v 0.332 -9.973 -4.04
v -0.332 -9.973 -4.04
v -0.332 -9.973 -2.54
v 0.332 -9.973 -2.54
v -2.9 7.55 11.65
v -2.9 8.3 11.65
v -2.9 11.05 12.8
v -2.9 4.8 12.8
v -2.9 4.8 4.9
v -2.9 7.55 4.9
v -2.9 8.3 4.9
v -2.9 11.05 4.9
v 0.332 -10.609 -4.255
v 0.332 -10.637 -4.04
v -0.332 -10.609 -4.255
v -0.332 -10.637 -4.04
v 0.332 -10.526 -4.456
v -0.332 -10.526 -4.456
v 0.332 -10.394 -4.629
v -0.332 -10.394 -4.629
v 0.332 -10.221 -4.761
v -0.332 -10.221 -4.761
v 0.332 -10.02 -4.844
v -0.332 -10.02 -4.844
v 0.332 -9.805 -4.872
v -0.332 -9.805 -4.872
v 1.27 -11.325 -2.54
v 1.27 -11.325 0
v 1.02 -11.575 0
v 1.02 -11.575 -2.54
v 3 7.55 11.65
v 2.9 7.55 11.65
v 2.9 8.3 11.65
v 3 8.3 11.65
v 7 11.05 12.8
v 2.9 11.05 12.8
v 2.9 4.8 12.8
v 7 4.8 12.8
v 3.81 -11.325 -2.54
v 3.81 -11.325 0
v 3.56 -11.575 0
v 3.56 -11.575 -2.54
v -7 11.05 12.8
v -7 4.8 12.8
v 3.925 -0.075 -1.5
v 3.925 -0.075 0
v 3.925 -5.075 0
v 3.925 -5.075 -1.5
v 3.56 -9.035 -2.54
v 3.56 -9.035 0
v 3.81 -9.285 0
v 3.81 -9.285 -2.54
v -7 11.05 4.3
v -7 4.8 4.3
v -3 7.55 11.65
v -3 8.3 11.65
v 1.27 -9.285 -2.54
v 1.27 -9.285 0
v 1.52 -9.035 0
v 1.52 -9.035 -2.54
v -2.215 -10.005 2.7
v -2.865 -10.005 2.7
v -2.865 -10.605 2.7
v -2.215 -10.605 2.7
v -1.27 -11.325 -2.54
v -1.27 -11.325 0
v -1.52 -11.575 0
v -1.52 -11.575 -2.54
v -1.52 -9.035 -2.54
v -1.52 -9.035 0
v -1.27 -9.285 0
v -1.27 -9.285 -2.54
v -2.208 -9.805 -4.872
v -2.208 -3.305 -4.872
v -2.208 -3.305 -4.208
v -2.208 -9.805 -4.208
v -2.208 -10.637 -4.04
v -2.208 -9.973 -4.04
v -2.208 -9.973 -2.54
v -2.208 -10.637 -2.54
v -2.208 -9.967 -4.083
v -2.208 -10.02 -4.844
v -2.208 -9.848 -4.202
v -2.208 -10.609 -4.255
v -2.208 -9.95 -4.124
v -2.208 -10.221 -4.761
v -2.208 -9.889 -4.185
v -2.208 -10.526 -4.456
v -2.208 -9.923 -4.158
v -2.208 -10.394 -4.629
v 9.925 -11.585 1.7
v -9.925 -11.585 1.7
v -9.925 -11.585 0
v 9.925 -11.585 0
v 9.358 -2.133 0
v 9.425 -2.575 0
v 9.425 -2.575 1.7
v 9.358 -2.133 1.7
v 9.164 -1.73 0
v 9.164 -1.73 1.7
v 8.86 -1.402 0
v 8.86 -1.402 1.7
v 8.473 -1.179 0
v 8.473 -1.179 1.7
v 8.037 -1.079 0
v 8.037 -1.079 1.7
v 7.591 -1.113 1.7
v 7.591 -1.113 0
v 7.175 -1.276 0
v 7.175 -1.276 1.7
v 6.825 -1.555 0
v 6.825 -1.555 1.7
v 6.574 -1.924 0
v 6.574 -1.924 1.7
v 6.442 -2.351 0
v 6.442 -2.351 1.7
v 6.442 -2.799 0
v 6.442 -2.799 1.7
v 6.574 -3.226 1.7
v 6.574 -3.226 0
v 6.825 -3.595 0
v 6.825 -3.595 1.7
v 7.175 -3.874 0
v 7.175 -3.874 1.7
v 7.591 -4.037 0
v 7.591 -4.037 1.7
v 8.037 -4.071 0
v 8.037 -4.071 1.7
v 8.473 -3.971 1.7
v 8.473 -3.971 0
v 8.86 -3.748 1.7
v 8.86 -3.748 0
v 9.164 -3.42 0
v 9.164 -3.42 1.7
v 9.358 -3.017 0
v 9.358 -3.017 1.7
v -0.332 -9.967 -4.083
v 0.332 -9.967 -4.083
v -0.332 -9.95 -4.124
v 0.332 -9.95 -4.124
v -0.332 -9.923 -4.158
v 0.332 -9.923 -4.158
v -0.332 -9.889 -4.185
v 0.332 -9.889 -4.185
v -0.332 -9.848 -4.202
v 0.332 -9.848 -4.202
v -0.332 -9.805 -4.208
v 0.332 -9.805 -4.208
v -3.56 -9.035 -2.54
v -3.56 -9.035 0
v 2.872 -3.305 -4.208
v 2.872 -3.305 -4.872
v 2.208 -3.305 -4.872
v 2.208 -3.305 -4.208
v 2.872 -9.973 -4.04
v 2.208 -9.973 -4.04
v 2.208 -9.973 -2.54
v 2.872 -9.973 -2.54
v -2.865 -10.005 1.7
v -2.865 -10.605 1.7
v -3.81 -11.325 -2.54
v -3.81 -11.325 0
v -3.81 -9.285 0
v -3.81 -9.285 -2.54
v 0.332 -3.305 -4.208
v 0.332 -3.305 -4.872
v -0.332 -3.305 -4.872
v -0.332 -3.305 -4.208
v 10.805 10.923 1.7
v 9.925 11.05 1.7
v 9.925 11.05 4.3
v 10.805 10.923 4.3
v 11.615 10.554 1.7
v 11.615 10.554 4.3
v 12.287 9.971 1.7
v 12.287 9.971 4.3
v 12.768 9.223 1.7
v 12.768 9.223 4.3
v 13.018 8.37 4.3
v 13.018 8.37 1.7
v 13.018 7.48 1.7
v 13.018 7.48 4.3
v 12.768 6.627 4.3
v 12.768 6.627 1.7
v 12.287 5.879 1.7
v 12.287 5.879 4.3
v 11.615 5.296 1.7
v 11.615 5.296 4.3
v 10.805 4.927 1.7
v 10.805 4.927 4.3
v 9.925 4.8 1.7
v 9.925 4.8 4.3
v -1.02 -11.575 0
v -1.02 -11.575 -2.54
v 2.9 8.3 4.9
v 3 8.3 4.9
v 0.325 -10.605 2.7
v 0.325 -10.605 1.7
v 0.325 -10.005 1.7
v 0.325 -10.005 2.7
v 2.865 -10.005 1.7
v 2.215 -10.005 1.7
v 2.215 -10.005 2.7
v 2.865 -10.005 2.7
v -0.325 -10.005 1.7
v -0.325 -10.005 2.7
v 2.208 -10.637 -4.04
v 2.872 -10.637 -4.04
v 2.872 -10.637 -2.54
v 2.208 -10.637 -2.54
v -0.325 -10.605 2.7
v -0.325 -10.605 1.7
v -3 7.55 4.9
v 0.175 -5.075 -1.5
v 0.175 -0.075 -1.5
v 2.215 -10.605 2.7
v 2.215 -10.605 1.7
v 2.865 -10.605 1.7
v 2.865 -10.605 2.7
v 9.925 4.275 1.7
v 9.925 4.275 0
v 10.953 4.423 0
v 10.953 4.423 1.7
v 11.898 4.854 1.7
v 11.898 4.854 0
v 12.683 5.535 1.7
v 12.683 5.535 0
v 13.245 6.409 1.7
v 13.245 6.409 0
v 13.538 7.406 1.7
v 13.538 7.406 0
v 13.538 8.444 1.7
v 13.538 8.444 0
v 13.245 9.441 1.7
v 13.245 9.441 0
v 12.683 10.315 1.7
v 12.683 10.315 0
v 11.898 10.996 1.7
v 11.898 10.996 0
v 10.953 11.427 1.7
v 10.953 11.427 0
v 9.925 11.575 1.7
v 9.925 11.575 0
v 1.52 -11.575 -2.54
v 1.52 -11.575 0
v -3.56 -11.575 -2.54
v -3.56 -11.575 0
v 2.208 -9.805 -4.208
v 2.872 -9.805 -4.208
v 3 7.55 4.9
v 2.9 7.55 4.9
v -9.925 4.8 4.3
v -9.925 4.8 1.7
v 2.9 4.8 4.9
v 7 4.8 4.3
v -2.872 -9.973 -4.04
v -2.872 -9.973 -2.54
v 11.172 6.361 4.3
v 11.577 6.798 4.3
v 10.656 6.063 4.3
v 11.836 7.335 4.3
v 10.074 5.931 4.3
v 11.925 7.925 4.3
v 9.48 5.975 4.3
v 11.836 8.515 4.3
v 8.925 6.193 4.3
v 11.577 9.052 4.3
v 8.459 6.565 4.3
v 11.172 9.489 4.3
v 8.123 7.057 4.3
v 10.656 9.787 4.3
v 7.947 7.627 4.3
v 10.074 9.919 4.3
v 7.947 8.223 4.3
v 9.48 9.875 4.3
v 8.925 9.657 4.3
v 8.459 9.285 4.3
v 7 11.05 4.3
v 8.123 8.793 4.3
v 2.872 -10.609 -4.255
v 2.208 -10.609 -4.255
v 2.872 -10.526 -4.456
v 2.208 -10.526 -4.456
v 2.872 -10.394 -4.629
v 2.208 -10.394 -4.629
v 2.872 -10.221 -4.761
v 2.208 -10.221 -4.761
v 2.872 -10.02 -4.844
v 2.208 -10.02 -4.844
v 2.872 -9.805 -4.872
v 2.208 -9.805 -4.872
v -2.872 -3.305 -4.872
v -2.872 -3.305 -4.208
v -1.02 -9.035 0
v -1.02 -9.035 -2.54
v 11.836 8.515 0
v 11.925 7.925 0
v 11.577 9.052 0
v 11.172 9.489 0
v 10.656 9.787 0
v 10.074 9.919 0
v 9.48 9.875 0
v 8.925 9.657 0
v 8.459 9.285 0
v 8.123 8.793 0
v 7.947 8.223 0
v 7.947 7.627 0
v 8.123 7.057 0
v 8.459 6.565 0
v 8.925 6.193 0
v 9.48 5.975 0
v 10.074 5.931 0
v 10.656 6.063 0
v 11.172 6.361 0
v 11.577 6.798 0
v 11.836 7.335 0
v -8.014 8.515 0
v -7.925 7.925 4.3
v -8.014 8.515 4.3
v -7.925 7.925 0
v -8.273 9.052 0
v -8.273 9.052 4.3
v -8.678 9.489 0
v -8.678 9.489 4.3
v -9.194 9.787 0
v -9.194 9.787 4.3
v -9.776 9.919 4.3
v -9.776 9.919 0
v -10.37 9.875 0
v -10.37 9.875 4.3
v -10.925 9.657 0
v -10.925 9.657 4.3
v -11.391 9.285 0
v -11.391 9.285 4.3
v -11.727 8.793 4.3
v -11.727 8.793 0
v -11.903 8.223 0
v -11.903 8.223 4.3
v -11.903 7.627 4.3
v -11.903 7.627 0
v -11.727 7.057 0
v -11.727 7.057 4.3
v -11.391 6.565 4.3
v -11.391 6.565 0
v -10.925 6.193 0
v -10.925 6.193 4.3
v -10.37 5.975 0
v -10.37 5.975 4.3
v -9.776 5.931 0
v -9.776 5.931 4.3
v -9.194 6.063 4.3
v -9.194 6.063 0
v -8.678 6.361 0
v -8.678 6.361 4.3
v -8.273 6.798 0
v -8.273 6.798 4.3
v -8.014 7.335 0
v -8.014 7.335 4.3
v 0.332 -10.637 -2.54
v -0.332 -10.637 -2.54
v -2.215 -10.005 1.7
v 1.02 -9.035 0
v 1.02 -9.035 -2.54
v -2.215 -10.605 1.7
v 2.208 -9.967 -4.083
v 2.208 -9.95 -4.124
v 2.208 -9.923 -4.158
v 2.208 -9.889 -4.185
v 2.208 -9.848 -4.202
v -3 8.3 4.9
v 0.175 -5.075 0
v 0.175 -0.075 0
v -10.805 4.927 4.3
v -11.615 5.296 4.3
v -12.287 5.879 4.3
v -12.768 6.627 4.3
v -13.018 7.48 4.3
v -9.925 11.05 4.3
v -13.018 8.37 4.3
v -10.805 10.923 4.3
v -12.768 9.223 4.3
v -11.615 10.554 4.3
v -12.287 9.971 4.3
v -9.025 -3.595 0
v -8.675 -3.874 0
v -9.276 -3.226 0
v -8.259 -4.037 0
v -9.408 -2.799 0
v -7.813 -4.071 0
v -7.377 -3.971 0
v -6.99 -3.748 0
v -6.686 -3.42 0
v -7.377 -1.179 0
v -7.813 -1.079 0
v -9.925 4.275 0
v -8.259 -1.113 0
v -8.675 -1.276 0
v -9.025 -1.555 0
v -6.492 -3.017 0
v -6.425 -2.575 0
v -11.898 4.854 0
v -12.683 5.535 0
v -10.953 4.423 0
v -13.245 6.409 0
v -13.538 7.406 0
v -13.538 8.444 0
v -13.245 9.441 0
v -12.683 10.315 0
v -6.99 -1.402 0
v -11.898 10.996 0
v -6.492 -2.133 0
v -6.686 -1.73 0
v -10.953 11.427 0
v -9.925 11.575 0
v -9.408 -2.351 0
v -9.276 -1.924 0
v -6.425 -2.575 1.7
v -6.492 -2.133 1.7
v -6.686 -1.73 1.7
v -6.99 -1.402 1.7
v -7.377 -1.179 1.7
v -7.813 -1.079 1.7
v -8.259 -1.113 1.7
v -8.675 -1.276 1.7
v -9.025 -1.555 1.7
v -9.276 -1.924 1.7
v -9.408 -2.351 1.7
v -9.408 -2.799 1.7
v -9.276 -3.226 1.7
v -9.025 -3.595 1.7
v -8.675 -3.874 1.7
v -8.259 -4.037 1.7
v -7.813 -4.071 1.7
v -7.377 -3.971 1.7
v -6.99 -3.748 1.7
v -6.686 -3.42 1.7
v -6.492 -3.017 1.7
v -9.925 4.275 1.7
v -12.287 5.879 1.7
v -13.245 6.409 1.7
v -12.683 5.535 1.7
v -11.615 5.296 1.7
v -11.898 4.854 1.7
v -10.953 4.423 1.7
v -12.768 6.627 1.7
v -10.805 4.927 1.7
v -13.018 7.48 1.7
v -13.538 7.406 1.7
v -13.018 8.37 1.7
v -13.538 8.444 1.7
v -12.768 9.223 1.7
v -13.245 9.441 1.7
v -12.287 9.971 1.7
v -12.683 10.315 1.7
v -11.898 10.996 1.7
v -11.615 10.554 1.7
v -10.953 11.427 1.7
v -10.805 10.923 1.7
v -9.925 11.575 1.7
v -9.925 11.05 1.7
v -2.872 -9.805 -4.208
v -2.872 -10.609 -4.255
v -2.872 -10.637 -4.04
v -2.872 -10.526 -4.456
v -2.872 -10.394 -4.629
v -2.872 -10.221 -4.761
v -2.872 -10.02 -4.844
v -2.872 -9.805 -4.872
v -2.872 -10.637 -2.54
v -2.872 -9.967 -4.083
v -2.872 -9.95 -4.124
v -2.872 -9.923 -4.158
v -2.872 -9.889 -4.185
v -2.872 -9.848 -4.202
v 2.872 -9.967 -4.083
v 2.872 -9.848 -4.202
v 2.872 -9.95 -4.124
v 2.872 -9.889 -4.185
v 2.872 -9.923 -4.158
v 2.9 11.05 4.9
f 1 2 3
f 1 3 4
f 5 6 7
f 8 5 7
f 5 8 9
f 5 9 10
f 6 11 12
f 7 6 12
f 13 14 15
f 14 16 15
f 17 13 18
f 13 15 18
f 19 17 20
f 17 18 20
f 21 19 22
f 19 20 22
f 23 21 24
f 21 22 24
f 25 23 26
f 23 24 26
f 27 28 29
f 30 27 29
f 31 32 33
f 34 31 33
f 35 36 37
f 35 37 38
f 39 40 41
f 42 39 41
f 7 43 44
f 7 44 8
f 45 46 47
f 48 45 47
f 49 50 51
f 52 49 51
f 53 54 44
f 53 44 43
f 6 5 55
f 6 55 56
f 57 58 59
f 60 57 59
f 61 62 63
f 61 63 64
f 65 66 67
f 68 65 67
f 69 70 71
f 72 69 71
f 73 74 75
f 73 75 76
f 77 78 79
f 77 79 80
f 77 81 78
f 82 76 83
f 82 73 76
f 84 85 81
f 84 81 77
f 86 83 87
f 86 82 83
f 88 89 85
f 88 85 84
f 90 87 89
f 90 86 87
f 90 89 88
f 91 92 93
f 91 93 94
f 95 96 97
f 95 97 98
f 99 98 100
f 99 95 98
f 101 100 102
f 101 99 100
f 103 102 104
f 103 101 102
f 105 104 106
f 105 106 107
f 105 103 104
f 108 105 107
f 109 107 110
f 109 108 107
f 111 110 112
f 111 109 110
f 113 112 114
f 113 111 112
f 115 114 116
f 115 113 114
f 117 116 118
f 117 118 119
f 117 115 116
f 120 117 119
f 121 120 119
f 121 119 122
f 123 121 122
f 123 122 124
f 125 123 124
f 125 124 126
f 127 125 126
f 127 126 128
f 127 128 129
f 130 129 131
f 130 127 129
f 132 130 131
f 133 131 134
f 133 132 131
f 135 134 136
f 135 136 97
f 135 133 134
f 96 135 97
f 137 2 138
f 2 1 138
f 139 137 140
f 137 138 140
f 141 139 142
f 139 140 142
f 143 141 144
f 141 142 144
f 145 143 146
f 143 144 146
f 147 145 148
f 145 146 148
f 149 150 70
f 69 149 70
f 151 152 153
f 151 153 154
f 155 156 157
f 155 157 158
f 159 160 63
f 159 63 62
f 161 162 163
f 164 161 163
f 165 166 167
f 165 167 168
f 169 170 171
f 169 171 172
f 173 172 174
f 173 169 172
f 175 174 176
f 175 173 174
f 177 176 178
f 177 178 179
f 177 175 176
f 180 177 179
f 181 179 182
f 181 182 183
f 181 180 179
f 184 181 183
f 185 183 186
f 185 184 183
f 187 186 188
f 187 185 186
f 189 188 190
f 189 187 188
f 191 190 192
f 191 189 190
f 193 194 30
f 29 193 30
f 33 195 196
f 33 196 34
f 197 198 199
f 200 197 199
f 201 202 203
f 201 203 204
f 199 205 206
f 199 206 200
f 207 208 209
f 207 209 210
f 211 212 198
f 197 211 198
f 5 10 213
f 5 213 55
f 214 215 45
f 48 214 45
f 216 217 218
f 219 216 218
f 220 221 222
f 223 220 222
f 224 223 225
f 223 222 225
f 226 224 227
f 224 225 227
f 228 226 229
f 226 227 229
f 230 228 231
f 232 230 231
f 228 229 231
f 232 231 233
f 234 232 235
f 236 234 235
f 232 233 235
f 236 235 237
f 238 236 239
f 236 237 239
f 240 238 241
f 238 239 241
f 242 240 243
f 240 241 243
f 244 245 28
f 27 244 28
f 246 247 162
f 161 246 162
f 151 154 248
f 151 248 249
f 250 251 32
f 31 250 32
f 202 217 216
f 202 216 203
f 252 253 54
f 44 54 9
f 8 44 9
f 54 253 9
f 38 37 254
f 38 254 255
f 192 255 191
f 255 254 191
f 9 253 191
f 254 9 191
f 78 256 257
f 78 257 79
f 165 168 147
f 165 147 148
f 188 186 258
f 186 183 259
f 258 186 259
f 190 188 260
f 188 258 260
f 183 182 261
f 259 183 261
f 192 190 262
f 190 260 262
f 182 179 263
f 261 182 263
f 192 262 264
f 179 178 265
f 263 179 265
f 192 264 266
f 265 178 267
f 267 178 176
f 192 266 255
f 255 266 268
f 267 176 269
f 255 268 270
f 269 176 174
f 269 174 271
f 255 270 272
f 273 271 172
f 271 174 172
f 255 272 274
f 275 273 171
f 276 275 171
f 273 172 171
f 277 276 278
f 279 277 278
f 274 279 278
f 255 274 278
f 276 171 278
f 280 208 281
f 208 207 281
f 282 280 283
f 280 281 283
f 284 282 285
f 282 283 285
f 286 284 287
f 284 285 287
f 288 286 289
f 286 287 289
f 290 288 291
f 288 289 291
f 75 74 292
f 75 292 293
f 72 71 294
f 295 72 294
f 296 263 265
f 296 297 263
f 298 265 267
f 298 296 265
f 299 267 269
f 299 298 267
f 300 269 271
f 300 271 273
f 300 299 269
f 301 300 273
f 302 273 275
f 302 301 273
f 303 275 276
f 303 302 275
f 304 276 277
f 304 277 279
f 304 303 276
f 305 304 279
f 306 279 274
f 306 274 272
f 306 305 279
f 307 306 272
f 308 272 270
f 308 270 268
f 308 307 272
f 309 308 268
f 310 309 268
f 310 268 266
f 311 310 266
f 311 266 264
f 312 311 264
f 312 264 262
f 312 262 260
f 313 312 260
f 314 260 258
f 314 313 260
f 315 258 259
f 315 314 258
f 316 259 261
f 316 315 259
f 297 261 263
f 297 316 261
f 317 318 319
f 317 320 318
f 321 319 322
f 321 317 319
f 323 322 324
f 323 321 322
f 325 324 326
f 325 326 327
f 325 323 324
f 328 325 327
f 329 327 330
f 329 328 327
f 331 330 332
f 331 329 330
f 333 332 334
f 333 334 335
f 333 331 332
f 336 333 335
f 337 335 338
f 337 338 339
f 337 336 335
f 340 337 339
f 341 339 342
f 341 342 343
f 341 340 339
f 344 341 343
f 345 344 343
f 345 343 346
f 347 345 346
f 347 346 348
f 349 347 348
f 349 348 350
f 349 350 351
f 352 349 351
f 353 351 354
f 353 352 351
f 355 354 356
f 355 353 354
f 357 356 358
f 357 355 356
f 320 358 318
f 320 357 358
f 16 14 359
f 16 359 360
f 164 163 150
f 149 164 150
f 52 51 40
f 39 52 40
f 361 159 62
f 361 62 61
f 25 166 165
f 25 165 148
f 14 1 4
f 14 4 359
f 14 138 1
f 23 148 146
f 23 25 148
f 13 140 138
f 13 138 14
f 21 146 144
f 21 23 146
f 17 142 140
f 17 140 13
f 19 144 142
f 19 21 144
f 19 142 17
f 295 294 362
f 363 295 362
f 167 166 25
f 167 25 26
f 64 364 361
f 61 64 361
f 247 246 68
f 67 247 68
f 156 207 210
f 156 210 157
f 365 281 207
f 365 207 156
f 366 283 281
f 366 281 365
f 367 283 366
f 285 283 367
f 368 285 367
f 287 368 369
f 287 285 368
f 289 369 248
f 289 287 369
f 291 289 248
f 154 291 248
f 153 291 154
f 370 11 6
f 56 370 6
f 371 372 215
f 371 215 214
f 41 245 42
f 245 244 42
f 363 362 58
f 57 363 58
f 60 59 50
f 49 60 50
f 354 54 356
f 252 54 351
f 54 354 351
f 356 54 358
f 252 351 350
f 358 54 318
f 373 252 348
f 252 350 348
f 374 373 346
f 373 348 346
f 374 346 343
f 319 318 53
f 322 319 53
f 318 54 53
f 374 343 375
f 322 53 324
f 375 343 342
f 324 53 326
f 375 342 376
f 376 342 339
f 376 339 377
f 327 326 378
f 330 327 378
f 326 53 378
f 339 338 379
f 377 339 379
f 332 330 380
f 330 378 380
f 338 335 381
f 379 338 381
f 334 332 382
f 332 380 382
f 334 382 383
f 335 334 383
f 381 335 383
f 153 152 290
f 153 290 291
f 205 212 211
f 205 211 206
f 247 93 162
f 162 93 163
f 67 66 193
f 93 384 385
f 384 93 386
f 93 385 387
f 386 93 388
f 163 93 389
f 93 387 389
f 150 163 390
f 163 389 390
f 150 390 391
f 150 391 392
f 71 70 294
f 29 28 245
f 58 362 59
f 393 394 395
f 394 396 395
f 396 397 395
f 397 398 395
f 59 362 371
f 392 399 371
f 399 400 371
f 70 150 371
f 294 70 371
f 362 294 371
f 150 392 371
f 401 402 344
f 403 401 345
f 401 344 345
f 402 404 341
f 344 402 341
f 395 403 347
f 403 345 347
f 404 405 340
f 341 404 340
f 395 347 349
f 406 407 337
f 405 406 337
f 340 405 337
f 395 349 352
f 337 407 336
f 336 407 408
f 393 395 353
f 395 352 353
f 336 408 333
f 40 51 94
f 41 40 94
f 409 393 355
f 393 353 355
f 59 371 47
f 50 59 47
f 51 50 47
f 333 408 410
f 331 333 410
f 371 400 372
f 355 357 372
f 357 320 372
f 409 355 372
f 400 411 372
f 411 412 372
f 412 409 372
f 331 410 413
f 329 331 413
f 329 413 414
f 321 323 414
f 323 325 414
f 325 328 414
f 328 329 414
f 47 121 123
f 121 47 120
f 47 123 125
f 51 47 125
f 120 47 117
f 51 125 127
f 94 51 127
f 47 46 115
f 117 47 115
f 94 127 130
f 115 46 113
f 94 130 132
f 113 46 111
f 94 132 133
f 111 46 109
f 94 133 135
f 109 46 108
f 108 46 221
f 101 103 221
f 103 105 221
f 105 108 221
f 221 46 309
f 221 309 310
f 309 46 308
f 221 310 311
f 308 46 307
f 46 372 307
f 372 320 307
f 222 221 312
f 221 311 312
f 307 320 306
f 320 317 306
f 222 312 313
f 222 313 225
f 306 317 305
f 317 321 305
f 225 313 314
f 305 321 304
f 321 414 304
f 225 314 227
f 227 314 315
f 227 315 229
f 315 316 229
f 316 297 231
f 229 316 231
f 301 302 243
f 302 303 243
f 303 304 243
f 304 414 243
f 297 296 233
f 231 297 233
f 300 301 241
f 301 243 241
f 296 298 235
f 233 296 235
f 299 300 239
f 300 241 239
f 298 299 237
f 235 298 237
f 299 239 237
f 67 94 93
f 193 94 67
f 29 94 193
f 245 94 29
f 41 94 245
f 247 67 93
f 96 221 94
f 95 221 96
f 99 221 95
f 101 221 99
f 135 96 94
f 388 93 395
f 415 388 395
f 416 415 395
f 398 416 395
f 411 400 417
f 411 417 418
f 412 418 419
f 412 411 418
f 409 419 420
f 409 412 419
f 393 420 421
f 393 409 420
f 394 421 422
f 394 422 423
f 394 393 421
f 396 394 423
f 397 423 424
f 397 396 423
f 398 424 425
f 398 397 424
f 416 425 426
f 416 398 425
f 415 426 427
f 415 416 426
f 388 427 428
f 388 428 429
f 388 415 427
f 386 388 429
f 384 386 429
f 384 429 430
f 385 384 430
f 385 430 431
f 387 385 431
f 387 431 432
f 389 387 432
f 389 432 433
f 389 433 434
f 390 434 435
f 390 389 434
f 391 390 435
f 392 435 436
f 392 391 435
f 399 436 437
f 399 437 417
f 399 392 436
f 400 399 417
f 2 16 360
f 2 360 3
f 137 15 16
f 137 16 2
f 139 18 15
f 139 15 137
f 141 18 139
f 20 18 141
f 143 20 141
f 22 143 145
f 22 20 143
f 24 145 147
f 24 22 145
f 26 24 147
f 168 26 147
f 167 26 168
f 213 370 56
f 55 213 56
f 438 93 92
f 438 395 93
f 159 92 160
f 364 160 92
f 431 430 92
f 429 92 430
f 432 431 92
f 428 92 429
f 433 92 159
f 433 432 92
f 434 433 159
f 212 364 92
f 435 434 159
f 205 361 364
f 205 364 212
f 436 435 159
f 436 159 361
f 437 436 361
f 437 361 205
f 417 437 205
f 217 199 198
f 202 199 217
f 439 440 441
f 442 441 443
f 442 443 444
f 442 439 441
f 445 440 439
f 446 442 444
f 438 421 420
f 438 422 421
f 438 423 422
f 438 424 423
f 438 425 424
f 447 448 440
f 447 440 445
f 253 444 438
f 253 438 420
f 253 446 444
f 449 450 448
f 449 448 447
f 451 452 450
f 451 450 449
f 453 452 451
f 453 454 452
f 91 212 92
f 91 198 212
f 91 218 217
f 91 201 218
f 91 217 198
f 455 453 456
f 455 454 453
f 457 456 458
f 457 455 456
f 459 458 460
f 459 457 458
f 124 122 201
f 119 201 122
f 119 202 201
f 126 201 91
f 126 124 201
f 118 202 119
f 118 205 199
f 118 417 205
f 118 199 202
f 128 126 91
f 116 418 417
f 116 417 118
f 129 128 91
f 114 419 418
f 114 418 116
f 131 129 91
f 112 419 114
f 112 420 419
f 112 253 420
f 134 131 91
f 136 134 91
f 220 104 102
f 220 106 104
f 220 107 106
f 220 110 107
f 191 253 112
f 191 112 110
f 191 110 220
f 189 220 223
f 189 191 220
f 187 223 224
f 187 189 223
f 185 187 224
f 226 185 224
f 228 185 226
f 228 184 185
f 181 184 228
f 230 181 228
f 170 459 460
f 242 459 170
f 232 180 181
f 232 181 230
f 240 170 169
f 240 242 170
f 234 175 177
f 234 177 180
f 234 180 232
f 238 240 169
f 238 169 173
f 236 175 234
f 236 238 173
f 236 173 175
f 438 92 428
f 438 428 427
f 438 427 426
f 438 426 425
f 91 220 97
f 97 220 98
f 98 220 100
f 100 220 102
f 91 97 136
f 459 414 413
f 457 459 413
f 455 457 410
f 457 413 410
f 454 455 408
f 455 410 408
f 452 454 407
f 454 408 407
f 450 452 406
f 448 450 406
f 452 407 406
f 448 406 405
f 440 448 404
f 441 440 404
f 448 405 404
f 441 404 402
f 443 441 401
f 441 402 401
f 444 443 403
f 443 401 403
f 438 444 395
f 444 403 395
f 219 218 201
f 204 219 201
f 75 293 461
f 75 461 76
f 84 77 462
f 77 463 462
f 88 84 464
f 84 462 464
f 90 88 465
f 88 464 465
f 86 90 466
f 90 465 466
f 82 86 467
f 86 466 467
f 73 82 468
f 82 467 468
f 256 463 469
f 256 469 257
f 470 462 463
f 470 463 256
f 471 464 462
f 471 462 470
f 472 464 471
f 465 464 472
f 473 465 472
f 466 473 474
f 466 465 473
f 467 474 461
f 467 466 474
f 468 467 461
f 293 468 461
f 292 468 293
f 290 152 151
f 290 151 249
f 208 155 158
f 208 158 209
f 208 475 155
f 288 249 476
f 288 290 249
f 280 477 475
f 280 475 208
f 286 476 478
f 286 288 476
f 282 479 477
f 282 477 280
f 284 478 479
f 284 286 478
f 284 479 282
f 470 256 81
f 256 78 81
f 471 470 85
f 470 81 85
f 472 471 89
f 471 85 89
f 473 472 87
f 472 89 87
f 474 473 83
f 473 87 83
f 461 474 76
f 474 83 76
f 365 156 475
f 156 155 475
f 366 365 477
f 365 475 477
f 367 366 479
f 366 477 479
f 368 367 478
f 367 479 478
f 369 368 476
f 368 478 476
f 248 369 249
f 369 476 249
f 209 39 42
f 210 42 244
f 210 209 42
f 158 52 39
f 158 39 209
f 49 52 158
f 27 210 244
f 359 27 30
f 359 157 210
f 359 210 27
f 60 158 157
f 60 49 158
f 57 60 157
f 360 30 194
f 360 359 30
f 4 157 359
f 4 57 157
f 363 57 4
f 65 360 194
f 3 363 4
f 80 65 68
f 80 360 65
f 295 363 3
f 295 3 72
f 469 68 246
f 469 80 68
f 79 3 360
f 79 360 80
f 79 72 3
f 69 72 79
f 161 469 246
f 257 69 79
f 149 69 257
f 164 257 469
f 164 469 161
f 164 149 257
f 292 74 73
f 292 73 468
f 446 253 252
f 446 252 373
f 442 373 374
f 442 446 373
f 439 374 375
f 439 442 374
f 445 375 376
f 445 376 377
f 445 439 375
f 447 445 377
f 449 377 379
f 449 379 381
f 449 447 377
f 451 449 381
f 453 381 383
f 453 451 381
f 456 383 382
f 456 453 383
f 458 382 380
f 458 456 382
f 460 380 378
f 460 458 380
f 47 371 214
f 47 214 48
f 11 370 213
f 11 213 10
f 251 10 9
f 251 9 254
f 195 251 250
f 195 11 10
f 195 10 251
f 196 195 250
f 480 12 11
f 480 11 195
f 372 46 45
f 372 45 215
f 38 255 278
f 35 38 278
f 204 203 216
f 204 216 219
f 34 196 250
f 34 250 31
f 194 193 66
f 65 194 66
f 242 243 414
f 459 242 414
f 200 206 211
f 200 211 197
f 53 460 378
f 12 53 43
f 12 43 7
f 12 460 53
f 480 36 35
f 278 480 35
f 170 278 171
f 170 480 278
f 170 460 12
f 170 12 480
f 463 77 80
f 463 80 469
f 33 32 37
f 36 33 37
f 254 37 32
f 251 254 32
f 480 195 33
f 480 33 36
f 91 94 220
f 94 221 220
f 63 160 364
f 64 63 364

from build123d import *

# Parameters (mm, degrees)
IZIM1_R                     = 2
IZIM1_R_2                   = 1.5
Y_KSEKLIK_EKSTR_ZYON1_DEPTH = 1.7
IZIM2_R                     = 2
Y_KSEKLIK_EKSTR_ZYON2_DEPTH = 2.6
IZIM3_W                     = 4.100055298
IZIM3_H                     = 6.25
Y_KSEKLIK_EKSTR_ZYON3_DEPTH = 8.5
IZIM4_W                     = 5.8
IZIM4_H                     = 6.25
Y_KSEKLIK_EKSTR_ZYON4_DEPTH = 0.6
Y_KSEKLIK_EKSTR_ZYON6_DEPTH = 2.54
IZIM6_W                     = 19.85
IZIM6_H                     = 1.7
Y_KSEKLIK_EKSTR_ZYON7_DEPTH = 0.01
IZIM7_W                     = 6.75
IZIM7_H                     = 0.75
KES_EKSTR_ZYON1_DEPTH       = 5.9
KES_EKSTR_ZYON1_DEPTH_BACK  = 0.1
IZIM8_W                     = 0.664910116
IZIM8_H                     = 0.664910116
IZIM11_W                    = 0.65
IZIM11_H                    = 0.6
Y_KSEKLIK_EKSTR_ZYON8_DEPTH = 1
Y_KSEKLIK_EKSTR_ZYON9_DEPTH = 1.5


with BuildPart() as part:
    # Çizim1 → Yükseklik-Ekstrüzyon1 (new body)
    with BuildSketch(Plane.XY):
        with BuildLine():
            Line((-9.925, -11.575), (9.925, -11.575))
            Line((9.925, -11.575), (9.925, 4.275))
            ThreePointArc((9.925, 4.275), (13.575, 7.925), (9.925, 11.575))
            Line((9.925, 11.575), (-9.925, 11.575))
            ThreePointArc((-9.925, 11.575), (-13.575, 7.925), (-9.925, 4.275))
            Line((-9.925, 4.275), (-9.925, -11.575))
        make_face()
        with Locations((9.925, 7.925)):
            Circle(IZIM1_R, mode=Mode.SUBTRACT)
        with Locations((-9.925, 7.925)):
            Circle(IZIM1_R, mode=Mode.SUBTRACT)
        with Locations((7.925, -2.575)):
            Circle(IZIM1_R_2, mode=Mode.SUBTRACT)
        with Locations((-7.925, -2.575)):
            Circle(IZIM1_R_2, mode=Mode.SUBTRACT)
    extrude(amount=Y_KSEKLIK_EKSTR_ZYON1_DEPTH)

    # Çizim2 → Yükseklik-Ekstrüzyon2 (add)
    with BuildSketch(Plane.XY.offset(1.7)):
        with BuildLine():
            Line((-9.925, 11.05), (9.925, 11.05))
            ThreePointArc((9.925, 11.05), (13.05, 7.925), (9.925, 4.8))
            Line((9.925, 4.8), (-9.925, 4.8))
            ThreePointArc((-9.925, 4.8), (-13.05, 7.925), (-9.925, 11.05))
        make_face()
        with Locations((-9.925, 7.925)):
            Circle(IZIM2_R, mode=Mode.SUBTRACT)
        with Locations((9.925, 7.925)):
            Circle(IZIM2_R, mode=Mode.SUBTRACT)
    extrude(amount=Y_KSEKLIK_EKSTR_ZYON2_DEPTH)

    # Çizim3 → Yükseklik-Ekstrüzyon3 (add)
    with BuildSketch(Plane.XY.offset(4.3)):
        with Locations((4.950027649, 7.925)):
            Rectangle(IZIM3_W, IZIM3_H)
        with Locations((-4.950027649, 7.925)):
            Rectangle(IZIM3_W, IZIM3_H)
    extrude(amount=Y_KSEKLIK_EKSTR_ZYON3_DEPTH)

    # Çizim4 → Yükseklik-Ekstrüzyon4 (add)
    with BuildSketch(Plane.XY.offset(4.3)):
        with Locations((0, 7.925)):
            Rectangle(IZIM4_W, IZIM4_H)
    extrude(amount=Y_KSEKLIK_EKSTR_ZYON4_DEPTH)

    # Çizim5 → Yükseklik-Ekstrüzyon6 (add)
    with BuildSketch(Plane(origin=(0, 0, 0), x_dir=(-1, 0, 0), z_dir=(0, 0, -1))):
        Polygon((-1.27, -11.325), (-1.27, -9.285), (-1.52, -9.035), (-3.56, -9.035), (-3.81, -9.285), (-3.81, -11.325), (-3.56, -11.575), (-1.52, -11.575), align=None)
        Polygon((1.27, -9.285), (1.02, -9.035), (-1.02, -9.035), (-1.27, -9.285), (-1.27, -11.325), (-1.02, -11.575), (1.02, -11.575), (1.27, -11.325), align=None)
        Polygon((1.52, -9.035), (1.27, -9.285), (1.27, -11.325), (1.52, -11.575), (3.56, -11.575), (3.81, -11.325), (3.81, -9.285), (3.56, -9.035), align=None)
    extrude(amount=Y_KSEKLIK_EKSTR_ZYON6_DEPTH)

    # Çizim6 → Yükseklik-Ekstrüzyon7 (add)
    with BuildSketch(Plane.XZ.offset(11.575)):
        with Locations((0, 0.85)):
            Rectangle(IZIM6_W, IZIM6_H)
    extrude(amount=Y_KSEKLIK_EKSTR_ZYON7_DEPTH)

    # Çizim7 → Kes-Ekstrüzyon1 (cut, two sides)
    with BuildSketch(Plane.ZY.offset(-2.9)) as kes_ekstr_zyon1_sk:
        with Locations((8.275, 7.925)):
            Rectangle(IZIM7_W, IZIM7_H)
    extrude(amount=KES_EKSTR_ZYON1_DEPTH, mode=Mode.SUBTRACT)
    extrude(kes_ekstr_zyon1_sk.sketch, amount=-KES_EKSTR_ZYON1_DEPTH_BACK, mode=Mode.SUBTRACT)

    # Süpür1: sweep along a path in Çizim9
    with BuildLine(Plane(origin=(0, 0, 0), x_dir=(0, 0, -1), z_dir=(1, 0, 0))) as s_p_r1_path:
        Line((2.54, -10.305), (4.04, -10.305))
        ThreePointArc((4.04, -10.305), (4.393553391, -10.158553391), (4.54, -9.805))
        Line((4.54, -9.805), (4.54, -3.305))
    # Çizim8 → Süpür1 (sweep)
    with BuildSketch(Plane(origin=(0, 0, -2.54), x_dir=(-1, 0, 0), z_dir=(0, 0, -1))):
        with Locations((2.54, -10.305)):
            Rectangle(IZIM8_W, IZIM8_H)
        with Locations((0, -10.305)):
            Rectangle(IZIM8_W, IZIM8_H)
        with Locations((-2.54, -10.305)):
            Rectangle(IZIM8_W, IZIM8_H)
    sweep(path=s_p_r1_path.line)

    # Çizim11 → Yükseklik-Ekstrüzyon8 (add)
    with BuildSketch(Plane.XY.offset(1.7)):
        with Locations((-2.54, -10.305)):
            Rectangle(IZIM11_W, IZIM11_H)
        with Locations((0, -10.305)):
            Rectangle(IZIM11_W, IZIM11_H)
        with Locations((2.54, -10.305)):
            Rectangle(IZIM11_W, IZIM11_H)
    extrude(amount=Y_KSEKLIK_EKSTR_ZYON8_DEPTH)

    # Çizim12 → Yükseklik-Ekstrüzyon9 (add)
    with BuildSketch(Plane(origin=(0, 0, 0), x_dir=(-1, 0, 0), z_dir=(0, 0, -1))):
        Polygon((-3.925, -2.575), (-3.925, -0.075), (-0.175, -0.075), (-0.175, -5.075), (-3.925, -5.075), align=None)
    extrude(amount=Y_KSEKLIK_EKSTR_ZYON9_DEPTH)


solid = part.part
